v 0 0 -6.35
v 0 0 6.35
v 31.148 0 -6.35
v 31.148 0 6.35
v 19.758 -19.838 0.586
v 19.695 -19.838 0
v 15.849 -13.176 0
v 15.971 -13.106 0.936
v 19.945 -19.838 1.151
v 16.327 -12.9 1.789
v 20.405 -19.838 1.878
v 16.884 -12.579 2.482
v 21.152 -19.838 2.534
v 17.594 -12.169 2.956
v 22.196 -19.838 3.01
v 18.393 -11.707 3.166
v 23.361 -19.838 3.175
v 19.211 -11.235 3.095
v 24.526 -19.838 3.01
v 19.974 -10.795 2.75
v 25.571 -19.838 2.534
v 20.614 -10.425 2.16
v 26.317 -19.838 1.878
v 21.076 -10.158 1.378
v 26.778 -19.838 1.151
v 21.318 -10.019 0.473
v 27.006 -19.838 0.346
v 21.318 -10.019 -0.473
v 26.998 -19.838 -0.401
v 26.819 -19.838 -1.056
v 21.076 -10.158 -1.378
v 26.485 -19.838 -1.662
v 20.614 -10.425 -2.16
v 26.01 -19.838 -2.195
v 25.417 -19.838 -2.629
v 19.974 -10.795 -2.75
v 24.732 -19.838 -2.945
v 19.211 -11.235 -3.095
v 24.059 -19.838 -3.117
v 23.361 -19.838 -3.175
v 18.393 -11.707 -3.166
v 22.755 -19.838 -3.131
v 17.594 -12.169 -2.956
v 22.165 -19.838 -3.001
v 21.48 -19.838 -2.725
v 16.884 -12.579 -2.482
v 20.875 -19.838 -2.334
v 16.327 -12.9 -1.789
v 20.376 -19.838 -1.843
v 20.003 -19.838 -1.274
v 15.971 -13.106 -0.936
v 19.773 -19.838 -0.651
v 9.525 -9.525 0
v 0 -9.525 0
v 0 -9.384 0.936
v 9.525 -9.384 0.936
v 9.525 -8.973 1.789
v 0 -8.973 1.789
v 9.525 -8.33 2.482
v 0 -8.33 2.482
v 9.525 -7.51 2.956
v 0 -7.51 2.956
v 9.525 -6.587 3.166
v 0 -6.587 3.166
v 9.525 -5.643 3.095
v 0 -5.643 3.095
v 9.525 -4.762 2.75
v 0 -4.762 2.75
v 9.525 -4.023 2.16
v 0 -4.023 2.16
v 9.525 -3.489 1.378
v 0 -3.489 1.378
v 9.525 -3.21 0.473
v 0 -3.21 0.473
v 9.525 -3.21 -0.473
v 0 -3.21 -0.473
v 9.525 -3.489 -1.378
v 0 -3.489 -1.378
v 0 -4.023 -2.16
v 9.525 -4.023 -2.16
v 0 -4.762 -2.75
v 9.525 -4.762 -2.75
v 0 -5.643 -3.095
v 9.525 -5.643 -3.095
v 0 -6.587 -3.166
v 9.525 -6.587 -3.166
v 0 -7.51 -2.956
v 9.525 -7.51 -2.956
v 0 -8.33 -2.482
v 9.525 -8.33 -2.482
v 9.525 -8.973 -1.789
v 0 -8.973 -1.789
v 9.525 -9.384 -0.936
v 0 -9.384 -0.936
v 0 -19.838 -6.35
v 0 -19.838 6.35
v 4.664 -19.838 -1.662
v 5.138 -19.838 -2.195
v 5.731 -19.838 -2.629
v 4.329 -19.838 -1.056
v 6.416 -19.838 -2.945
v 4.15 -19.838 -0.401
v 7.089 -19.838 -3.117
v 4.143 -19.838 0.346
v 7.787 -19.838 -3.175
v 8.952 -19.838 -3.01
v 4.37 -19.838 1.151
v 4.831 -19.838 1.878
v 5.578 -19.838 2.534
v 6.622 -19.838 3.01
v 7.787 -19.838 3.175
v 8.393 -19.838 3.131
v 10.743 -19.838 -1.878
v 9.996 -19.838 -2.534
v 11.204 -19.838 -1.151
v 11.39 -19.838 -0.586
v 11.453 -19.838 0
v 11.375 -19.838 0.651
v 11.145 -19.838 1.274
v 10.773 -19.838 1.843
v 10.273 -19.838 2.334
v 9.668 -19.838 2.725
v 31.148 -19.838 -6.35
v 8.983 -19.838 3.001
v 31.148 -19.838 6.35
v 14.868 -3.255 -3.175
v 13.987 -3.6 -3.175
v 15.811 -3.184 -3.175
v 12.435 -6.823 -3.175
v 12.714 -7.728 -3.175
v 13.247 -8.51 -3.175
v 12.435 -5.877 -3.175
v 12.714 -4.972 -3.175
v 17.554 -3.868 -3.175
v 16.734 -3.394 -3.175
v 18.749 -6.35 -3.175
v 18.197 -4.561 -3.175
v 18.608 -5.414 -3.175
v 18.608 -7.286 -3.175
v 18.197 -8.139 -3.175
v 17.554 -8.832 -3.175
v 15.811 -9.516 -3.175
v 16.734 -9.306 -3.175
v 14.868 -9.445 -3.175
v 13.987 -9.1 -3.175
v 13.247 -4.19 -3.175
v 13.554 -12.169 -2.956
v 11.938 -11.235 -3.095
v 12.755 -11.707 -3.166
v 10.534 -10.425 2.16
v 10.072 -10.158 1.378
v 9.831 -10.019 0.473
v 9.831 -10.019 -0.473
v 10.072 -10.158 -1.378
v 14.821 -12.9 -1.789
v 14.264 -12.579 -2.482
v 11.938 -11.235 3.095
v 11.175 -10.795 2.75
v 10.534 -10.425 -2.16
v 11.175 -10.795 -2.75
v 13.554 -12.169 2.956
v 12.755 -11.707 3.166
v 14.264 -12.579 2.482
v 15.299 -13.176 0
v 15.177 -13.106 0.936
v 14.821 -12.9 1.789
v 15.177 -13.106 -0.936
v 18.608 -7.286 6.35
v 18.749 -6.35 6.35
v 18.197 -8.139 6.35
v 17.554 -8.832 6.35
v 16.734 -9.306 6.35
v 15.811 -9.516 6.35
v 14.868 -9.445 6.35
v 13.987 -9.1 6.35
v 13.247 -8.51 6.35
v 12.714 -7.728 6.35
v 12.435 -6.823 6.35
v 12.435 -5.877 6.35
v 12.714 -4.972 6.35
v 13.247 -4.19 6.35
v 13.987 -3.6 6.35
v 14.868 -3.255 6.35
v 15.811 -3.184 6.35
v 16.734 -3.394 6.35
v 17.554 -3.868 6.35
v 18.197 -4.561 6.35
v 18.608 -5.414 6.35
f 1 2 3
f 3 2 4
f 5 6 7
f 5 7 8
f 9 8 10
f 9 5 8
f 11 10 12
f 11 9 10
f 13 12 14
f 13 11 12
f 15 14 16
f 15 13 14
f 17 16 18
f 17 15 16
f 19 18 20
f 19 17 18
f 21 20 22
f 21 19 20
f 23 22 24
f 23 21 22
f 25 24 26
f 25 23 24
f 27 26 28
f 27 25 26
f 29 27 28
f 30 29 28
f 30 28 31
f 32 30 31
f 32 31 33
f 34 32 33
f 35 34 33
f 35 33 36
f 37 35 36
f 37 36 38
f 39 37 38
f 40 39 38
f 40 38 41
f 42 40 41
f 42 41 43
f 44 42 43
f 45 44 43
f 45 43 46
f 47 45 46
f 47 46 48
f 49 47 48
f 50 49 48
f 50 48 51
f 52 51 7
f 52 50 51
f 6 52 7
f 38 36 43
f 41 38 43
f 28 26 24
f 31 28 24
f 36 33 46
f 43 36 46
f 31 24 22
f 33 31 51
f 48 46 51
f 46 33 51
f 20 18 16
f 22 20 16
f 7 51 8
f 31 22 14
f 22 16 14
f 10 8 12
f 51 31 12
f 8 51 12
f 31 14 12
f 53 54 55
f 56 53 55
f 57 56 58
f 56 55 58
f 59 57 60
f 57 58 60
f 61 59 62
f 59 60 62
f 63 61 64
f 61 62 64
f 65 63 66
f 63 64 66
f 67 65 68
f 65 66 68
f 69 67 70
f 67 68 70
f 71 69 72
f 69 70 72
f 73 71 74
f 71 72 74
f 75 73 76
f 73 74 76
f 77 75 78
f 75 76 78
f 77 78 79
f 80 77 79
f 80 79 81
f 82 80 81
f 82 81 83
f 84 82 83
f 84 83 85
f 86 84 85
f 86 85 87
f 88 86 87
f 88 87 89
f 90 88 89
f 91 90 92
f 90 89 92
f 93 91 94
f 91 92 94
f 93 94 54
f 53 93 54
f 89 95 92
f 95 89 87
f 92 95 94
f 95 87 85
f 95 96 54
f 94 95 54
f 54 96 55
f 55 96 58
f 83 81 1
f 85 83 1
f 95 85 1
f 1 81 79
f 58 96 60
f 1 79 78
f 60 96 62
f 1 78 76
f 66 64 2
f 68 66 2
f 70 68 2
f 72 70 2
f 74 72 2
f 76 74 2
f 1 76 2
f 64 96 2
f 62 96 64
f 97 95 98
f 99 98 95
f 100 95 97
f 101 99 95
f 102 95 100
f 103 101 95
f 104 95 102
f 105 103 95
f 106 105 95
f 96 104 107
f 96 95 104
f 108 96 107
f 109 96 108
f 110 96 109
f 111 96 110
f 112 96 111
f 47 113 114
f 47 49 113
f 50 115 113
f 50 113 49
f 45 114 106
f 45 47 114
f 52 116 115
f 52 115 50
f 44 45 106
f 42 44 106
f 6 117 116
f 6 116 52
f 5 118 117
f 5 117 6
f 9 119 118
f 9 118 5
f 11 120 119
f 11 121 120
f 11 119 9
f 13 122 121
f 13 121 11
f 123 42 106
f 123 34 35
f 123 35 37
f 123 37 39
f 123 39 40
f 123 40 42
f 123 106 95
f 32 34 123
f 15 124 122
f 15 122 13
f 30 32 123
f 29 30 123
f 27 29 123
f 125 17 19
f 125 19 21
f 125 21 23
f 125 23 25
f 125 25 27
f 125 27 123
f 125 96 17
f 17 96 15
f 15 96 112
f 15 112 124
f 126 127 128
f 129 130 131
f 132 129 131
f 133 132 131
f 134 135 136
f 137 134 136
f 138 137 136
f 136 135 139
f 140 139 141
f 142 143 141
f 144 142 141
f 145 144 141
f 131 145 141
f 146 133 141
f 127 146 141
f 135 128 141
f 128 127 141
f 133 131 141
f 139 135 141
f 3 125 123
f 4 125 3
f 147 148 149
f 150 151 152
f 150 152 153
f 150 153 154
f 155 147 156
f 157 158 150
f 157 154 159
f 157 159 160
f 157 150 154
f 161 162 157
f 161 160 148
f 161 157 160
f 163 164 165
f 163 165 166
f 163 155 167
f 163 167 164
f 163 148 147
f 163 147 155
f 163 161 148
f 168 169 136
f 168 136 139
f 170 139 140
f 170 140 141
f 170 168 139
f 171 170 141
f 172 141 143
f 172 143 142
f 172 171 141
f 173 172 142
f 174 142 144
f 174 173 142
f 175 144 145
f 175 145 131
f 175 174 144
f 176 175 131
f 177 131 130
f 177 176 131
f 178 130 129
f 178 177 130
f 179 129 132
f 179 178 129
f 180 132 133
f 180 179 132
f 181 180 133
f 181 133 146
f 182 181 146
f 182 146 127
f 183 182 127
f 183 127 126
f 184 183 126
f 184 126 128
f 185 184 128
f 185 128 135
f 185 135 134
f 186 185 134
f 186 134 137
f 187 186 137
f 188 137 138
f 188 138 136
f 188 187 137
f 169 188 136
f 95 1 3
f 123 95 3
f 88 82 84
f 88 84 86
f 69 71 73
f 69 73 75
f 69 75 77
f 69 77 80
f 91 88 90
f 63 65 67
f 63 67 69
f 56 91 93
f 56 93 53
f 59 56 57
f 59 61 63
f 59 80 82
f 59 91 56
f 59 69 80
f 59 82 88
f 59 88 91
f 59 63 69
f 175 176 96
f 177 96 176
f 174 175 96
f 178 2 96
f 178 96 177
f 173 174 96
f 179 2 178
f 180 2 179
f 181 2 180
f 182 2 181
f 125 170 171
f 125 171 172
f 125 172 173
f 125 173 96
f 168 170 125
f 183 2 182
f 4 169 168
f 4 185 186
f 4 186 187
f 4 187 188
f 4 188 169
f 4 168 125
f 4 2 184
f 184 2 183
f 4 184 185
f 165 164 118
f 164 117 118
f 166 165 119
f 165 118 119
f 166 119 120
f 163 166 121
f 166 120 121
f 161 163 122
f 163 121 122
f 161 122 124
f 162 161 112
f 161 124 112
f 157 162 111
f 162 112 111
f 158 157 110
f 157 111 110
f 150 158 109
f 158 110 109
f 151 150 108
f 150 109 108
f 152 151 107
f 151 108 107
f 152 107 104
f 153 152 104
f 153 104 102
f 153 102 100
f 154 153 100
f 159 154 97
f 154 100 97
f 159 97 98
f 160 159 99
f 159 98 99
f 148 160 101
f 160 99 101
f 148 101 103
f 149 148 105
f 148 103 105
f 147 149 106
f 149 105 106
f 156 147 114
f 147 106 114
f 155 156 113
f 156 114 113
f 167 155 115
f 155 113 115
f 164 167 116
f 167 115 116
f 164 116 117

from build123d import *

# Parameters (mm, degrees)
SKETCH3_W                      = 31.148374891
SKETCH3_H                      = 19.837641971
BOSS_EXTRUDE1_DEPTH            = 6.35
SKETCH4_R                      = 3.175
CUT_EXTRUDE1_DEPTH             = 9.525
SKETCH5_R                      = 3.175
CUT_EXTRUDE5_DEPTH             = 9.525
CUT_EXTRUDE5_DIRECTION_2_REACH = 33.299
SKETCH6_R                      = 3.175
CUT_EXTRUDE6_DEPTH             = 9.525


with BuildPart() as part:
    # Sketch3 → Boss-Extrude1 (new, symmetric)
    with BuildSketch(Plane.XY):
        with Locations((15.574187446, -9.918820986)):
            Rectangle(SKETCH3_W, SKETCH3_H)
    extrude(amount=BOSS_EXTRUDE1_DEPTH, both=True)

    # Sketch4 → Cut-Extrude1 (cut)
    with BuildSketch(Plane.ZY):
        with Locations(Location((0, -6.35, 0), (0, 0, 270))):
            Circle(SKETCH4_R)
    extrude(amount=-CUT_EXTRUDE1_DEPTH, mode=Mode.SUBTRACT)

    # Sketch5 → Cut-Extrude5 (cut)
    with BuildSketch(Plane(origin=(7.787093723, -19.837641971, 0), x_dir=(-0.8660254037844382, 0.500000000000001, 0), z_dir=(-0.500000000000001, -0.8660254037844382, 0))):
        with Locations(Location((0, 0, 0), (0, 0, 180))):
            Circle(SKETCH5_R)
    cut_extrude5 = extrude(amount=-CUT_EXTRUDE5_DEPTH, mode=Mode.SUBTRACT)

    # Sketch5 → Cut-Extrude5 direction 2 (cut, up to next)
    with BuildSketch(Plane(origin=(7.787093723, -19.837641971, 0), x_dir=(-0.8660254037844382, 0.500000000000001, 0), z_dir=(-0.500000000000001, -0.8660254037844382, 0)), mode=Mode.PRIVATE) as cut_extrude5_direction_2_sk1:
        with Locations(Location((0, 0, 0), (0, 0, 180))):
            Circle(SKETCH5_R)
    cut_extrude5_direction_2_tool1 = extrude(cut_extrude5_direction_2_sk1.sketch, amount=CUT_EXTRUDE5_DIRECTION_2_REACH, mode=Mode.PRIVATE) & part.part
    cut_extrude5_direction_2 = cut_extrude5_direction_2_tool1.solids().sort_by_distance((7.787094, -19.837642, 0))[0]
    add(cut_extrude5_direction_2, mode=Mode.SUBTRACT)

    # Sketch6 → Cut-Extrude6 (cut)
    with BuildSketch(Plane(origin=(0, 0, 6.35), x_dir=(-1, 0, 0), z_dir=(0, 0, -1))):
        with Locations(Location((-15.574187445, -6.35, 0), (0, 0, 180))):
            Circle(SKETCH6_R)
    extrude(amount=CUT_EXTRUDE6_DEPTH, mode=Mode.SUBTRACT)

    # Mirror1: Cut-Extrude5, Cut-Extrude5 direction 2 across plane
    add(cut_extrude5.mirror(Plane.ZY.offset(-15.574187445)), mode=Mode.SUBTRACT)
    add(cut_extrude5_direction_2.mirror(Plane.ZY.offset(-15.574187445)), mode=Mode.SUBTRACT)


solid = part.part
